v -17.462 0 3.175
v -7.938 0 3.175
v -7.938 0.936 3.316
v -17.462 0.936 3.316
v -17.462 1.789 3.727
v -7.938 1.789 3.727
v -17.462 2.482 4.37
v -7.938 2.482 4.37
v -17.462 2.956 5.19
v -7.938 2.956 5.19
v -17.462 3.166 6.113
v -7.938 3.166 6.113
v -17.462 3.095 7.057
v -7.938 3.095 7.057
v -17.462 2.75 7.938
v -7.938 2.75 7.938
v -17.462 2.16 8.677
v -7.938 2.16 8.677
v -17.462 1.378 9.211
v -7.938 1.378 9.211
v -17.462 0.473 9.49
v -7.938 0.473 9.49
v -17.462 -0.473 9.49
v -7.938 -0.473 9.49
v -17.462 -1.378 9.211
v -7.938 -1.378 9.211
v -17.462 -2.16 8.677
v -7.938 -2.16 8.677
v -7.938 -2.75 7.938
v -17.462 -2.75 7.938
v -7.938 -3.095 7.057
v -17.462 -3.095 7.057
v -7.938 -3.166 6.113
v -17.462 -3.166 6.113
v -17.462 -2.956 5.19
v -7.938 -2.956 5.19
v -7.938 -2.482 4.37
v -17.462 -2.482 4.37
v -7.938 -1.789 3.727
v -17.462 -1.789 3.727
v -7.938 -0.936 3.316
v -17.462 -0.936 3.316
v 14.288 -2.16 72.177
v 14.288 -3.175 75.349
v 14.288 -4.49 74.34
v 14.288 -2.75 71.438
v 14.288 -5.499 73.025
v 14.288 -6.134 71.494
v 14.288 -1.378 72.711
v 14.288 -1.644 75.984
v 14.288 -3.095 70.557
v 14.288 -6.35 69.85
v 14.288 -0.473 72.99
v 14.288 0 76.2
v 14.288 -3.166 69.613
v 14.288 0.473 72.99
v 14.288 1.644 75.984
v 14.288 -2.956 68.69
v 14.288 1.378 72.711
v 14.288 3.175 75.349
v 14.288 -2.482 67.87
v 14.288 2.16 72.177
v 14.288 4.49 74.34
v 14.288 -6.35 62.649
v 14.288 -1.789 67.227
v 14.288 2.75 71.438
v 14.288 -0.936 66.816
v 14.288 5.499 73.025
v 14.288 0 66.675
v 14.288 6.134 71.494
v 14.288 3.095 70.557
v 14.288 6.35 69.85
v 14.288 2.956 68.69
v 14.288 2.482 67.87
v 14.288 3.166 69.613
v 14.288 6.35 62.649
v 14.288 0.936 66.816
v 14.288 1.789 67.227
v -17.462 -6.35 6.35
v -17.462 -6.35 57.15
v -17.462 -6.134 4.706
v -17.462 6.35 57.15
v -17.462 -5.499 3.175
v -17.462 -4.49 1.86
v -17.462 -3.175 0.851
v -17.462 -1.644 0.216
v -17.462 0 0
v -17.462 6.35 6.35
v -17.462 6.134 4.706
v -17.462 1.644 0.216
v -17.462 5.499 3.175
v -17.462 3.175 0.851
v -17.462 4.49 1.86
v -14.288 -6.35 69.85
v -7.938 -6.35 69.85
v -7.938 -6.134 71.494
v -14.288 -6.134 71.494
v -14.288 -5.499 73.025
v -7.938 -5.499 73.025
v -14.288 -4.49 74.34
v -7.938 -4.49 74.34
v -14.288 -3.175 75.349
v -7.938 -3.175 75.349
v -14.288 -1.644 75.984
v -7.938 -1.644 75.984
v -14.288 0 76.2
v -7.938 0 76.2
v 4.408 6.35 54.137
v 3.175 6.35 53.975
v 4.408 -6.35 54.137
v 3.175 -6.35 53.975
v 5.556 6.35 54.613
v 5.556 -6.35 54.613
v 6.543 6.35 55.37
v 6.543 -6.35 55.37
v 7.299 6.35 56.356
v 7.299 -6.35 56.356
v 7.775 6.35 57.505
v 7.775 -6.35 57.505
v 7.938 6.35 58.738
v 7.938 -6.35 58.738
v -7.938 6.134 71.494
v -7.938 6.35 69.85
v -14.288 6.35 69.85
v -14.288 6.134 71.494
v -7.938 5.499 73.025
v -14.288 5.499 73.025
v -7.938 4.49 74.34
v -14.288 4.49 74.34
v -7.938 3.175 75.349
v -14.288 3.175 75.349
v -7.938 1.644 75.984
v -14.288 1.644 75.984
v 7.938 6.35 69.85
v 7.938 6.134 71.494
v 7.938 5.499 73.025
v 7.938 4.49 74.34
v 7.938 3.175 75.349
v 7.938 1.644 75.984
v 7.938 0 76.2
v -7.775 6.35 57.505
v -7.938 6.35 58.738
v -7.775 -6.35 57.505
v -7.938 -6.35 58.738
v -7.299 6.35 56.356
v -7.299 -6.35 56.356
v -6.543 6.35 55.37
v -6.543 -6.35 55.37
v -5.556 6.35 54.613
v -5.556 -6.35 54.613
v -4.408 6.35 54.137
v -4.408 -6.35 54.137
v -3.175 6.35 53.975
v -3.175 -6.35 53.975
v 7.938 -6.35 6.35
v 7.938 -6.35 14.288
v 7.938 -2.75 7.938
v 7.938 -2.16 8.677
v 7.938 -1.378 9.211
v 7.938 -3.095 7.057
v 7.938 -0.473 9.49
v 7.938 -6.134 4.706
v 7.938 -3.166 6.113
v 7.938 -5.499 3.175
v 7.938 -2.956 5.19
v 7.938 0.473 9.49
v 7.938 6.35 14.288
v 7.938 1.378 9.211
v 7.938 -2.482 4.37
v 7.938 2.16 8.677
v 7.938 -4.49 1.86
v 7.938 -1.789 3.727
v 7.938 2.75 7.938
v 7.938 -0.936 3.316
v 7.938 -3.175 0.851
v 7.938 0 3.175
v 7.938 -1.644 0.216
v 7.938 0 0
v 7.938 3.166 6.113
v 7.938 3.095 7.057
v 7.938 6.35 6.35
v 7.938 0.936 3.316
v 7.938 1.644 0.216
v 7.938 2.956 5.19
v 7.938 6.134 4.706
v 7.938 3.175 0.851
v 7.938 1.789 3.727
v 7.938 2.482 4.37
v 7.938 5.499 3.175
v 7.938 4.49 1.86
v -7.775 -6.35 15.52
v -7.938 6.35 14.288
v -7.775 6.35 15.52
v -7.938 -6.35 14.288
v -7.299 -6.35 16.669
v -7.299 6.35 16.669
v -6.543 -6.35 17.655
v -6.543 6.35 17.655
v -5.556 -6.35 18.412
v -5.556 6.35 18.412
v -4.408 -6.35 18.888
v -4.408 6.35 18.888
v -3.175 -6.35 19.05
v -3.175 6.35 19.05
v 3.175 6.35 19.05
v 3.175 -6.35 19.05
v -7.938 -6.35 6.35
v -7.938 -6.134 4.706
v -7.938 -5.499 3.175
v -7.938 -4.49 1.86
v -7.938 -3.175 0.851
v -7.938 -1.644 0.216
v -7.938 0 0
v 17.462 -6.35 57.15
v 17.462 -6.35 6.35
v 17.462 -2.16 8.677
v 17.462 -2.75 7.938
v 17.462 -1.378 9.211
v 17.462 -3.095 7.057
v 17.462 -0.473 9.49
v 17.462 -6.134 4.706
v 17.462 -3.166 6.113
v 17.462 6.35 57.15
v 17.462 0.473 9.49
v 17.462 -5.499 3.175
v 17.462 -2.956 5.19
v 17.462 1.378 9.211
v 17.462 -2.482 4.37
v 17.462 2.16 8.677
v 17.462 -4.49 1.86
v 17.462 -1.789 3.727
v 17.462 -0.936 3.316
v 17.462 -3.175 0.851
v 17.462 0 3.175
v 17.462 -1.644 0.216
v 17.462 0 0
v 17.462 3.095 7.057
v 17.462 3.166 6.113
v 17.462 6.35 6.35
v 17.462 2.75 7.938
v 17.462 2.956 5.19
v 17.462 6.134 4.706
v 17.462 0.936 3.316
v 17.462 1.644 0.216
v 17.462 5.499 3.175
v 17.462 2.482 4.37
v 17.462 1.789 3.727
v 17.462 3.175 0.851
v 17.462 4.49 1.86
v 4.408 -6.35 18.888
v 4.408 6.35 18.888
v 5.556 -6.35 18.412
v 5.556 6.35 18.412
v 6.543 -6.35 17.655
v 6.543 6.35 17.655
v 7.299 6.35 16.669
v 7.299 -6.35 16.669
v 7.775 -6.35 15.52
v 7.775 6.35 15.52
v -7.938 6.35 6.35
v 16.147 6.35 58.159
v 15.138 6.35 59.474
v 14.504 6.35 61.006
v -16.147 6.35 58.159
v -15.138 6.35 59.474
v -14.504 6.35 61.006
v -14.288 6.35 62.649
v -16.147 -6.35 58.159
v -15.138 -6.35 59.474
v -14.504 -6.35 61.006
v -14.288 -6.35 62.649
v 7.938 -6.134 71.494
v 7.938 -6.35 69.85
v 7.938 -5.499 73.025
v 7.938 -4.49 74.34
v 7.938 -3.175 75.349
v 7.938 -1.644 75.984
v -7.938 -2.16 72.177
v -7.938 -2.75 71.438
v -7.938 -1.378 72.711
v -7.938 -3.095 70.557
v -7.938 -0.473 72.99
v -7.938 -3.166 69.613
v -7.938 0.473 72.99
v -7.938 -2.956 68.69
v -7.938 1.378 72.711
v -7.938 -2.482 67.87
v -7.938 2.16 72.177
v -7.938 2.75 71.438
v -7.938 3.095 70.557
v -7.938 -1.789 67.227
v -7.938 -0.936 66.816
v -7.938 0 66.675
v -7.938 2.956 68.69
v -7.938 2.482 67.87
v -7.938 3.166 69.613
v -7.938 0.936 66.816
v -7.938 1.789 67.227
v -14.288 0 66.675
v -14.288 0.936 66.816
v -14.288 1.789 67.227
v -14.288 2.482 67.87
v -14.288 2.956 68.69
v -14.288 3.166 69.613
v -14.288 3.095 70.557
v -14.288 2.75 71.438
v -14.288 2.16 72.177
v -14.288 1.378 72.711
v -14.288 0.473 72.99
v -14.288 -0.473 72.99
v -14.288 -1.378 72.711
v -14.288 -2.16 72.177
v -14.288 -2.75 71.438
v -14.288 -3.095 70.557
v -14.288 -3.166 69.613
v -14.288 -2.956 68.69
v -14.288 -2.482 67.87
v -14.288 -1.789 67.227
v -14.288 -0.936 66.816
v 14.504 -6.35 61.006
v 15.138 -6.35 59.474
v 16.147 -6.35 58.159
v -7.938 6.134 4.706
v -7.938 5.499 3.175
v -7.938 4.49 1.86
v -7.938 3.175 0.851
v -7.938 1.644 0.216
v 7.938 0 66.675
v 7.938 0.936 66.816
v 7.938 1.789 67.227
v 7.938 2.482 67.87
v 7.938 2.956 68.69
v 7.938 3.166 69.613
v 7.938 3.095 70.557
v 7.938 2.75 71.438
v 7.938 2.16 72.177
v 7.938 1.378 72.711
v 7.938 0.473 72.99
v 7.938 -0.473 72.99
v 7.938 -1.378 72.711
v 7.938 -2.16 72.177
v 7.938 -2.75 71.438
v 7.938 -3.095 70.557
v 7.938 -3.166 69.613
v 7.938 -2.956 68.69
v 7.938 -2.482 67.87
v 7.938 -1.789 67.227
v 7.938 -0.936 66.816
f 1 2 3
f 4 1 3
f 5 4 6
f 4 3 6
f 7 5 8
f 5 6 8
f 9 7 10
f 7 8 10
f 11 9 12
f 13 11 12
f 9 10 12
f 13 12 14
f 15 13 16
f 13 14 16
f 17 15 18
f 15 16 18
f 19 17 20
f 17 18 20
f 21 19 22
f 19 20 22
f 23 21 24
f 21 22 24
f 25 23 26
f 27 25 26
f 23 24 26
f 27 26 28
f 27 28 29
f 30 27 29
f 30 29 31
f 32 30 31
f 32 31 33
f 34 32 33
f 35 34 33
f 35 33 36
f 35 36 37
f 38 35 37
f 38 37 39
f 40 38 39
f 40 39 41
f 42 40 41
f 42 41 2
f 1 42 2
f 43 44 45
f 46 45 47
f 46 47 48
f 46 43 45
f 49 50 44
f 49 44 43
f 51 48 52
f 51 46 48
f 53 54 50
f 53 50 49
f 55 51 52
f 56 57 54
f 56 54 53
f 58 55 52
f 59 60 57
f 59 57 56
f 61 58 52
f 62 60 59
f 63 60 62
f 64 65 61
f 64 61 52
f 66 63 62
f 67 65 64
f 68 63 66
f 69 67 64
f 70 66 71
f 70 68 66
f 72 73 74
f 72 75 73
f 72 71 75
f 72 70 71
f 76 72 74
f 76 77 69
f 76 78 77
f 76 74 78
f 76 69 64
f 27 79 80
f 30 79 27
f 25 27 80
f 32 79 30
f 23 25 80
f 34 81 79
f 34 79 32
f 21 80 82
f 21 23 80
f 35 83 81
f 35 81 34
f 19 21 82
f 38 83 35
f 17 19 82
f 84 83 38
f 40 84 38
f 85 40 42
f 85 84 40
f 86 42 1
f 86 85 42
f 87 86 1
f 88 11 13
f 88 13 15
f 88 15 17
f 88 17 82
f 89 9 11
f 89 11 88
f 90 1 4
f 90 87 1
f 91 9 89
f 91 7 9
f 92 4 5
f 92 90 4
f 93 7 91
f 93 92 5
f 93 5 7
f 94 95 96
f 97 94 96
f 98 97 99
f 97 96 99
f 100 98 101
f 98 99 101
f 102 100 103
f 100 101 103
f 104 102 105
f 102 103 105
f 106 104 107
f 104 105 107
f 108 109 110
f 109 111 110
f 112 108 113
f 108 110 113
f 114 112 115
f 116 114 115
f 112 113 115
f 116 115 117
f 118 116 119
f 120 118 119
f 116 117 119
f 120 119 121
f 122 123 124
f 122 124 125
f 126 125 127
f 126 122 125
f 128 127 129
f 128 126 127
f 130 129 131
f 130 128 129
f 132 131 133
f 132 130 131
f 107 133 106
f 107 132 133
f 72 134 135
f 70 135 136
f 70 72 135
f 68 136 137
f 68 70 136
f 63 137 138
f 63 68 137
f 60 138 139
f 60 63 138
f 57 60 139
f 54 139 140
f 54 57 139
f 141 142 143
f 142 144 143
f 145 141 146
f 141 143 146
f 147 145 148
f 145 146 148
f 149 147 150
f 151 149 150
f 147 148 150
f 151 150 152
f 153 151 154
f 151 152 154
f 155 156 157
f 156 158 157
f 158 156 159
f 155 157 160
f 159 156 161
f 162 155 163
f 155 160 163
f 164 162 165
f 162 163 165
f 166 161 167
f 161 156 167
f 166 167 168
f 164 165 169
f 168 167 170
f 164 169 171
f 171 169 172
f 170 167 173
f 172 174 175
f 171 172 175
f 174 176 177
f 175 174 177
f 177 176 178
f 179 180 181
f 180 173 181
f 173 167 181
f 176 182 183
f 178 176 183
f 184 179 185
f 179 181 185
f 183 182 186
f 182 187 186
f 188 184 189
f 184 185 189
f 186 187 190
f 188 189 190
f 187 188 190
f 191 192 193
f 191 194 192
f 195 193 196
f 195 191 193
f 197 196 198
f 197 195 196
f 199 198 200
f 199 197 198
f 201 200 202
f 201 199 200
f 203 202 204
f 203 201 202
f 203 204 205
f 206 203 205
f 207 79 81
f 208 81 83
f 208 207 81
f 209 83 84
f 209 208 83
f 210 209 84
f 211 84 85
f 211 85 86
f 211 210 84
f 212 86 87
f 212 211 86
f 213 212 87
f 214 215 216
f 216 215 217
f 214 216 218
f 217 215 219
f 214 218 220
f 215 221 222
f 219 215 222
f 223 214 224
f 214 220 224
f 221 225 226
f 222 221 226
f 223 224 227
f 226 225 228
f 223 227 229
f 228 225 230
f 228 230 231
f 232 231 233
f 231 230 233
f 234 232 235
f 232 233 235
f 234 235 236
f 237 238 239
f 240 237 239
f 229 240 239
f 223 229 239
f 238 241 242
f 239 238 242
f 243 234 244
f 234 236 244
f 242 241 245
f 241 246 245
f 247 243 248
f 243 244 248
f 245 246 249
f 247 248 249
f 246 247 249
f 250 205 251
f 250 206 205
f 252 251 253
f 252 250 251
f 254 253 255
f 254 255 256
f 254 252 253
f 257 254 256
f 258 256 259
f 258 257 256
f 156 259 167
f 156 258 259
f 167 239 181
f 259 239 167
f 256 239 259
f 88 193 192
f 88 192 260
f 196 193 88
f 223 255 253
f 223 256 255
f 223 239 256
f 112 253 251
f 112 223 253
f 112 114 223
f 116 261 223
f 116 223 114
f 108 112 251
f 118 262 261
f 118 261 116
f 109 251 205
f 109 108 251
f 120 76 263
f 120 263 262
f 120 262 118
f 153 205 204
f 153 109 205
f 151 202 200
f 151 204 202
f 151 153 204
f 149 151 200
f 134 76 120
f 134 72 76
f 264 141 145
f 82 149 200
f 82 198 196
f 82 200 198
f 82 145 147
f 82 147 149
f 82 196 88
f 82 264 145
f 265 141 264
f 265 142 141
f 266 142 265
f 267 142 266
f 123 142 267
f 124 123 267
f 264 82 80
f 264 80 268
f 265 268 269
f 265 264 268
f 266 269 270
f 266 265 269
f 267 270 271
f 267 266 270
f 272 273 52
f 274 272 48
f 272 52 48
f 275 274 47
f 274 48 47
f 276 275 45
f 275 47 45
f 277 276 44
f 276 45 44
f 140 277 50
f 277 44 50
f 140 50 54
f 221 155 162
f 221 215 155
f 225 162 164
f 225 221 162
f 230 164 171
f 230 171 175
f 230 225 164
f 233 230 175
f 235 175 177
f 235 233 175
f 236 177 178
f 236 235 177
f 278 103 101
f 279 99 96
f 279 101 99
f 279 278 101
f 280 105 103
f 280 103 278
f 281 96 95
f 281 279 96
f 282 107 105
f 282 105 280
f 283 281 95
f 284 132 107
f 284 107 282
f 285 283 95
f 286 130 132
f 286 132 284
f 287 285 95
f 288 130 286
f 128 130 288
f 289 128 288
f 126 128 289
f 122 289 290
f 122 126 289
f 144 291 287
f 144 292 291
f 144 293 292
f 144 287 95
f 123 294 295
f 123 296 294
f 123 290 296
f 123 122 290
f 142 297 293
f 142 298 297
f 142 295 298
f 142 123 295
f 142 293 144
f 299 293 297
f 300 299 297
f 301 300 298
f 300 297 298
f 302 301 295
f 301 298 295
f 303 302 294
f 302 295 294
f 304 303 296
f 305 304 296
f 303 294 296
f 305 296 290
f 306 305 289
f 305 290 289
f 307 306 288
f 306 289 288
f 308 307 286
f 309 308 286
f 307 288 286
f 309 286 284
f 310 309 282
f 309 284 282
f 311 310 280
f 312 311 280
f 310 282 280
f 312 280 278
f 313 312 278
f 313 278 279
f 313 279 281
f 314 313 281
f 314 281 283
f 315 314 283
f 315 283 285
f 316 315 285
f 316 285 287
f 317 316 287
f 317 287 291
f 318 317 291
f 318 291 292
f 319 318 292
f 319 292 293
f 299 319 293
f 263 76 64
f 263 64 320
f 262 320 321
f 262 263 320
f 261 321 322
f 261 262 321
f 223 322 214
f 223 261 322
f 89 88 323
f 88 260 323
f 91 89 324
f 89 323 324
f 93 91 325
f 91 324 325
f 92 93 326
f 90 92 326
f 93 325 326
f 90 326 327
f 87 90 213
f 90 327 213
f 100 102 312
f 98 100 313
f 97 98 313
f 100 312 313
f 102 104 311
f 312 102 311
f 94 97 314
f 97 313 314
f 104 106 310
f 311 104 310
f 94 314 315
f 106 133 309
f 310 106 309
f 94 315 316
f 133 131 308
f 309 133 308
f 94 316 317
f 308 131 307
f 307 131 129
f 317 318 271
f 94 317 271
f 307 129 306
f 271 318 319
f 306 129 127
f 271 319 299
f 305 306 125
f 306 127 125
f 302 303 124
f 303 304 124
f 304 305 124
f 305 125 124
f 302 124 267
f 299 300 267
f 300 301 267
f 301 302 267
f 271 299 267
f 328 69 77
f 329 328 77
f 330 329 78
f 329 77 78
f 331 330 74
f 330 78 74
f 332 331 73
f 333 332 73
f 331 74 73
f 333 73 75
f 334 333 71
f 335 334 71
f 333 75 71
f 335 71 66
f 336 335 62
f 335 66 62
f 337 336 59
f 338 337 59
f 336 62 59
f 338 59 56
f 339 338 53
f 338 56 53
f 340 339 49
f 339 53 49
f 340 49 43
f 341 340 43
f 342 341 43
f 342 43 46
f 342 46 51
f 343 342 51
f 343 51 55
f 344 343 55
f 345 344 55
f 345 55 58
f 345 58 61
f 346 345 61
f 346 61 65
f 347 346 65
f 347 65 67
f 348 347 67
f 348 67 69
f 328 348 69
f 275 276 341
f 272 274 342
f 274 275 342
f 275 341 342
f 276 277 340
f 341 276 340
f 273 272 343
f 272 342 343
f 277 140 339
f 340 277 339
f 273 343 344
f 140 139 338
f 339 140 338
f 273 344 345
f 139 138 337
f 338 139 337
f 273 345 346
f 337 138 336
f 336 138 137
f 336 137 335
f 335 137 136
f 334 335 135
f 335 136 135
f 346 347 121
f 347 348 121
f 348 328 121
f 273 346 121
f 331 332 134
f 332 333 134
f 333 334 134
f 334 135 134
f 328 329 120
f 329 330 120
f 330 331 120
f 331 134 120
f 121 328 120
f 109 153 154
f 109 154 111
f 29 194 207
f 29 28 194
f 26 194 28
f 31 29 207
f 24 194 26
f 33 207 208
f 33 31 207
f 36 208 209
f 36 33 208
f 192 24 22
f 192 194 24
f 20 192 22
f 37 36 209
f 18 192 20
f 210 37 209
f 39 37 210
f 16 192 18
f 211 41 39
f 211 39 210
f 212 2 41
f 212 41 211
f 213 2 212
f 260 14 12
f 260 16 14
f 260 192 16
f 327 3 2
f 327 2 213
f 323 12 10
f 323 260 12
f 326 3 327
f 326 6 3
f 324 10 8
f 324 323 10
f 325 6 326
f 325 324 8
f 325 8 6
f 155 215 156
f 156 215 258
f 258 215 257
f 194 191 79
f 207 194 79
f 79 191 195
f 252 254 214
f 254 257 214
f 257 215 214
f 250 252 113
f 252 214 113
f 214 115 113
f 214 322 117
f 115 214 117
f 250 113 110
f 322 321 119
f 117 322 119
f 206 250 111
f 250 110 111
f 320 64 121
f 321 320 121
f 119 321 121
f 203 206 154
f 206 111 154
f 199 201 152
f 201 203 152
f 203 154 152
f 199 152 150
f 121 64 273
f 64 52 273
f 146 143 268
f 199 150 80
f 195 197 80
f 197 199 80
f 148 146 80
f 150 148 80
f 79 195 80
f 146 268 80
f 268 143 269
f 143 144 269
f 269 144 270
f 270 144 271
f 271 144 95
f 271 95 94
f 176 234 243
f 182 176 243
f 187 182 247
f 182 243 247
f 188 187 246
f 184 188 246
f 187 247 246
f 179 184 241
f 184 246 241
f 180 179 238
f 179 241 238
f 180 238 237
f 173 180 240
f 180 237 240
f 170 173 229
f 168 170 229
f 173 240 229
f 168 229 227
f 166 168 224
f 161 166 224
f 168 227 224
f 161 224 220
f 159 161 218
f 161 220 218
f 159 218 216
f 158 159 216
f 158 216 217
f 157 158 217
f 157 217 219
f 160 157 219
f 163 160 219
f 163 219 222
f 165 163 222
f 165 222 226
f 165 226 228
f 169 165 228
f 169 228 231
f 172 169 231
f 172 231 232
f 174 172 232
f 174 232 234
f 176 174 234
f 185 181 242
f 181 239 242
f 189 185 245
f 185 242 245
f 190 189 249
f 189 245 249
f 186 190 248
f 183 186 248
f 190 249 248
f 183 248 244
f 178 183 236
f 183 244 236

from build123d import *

# Parameters (mm, degrees)
SKETCH4_W           = 34.925
SKETCH4_H           = 12.7
BOSS_EXTRUDE2_DEPTH = 76.2
SKETCH6_W           = 15.875
SKETCH6_H           = 22.225
SKETCH6_H_2         = 19.05
CUT_EXTRUDE4_DEPTH  = 80.200182489
FILLET3_R           = 6.35
SKETCH7_R           = 3.175
CUT_EXTRUDE5_DEPTH  = 85.062584572
FILLET4_R           = 4.7625
FILLET5_R           = 4.7625
SKETCH8_W           = 3.175
SKETCH8_H           = 19.05
CUT_EXTRUDE6_DEPTH  = 80.200182489
FILLET6_R           = 6.35


# Some blends are built 0.0001 mm under size
with BuildPart() as part:
    # Sketch4 → Boss-Extrude2 (new body)
    with BuildSketch(Plane.XY):
        Rectangle(SKETCH4_W, SKETCH4_H)
    extrude(amount=BOSS_EXTRUDE2_DEPTH)

    # Sketch6 → Cut-Extrude4 (cut, through all)
    with BuildSketch(Plane(origin=(0, 6.35, 0), x_dir=(1, 0, 0), z_dir=(0, 1, 0))):
        with Locations((0, -65.0875)):
            Rectangle(SKETCH6_W, SKETCH6_H)
        with Locations((0, -9.525)):
            Rectangle(SKETCH6_W, SKETCH6_H_2)
    extrude(amount=-CUT_EXTRUDE4_DEPTH, mode=Mode.SUBTRACT)

    # Fillet3
    fillet3_edges = [part.edges().sort_by_distance(p)[0] for p in [
        (-12.7, -6.35, 0),
        (12.7, -6.35, 0),
        (-12.7, 6.35, 0),
        (12.7, 6.35, 0),
        (12.7, -6.35, 76.2),
        (12.7, 6.35, 76.2),
        (-12.7, -6.35, 76.2),
        (-12.7, 6.35, 76.2),
    ]]
    fillet(fillet3_edges, radius=FILLET3_R - 0.0001)  # a hair under: the kernel refuses the full size

    # Sketch7 → Cut-Extrude5 (cut, through all)
    with BuildSketch(Plane(origin=(17.4625, 0, 0), x_dir=(0, 0, -1), z_dir=(1, 0, 0))):
        with Locations((-6.35, 0)):
            Circle(SKETCH7_R)
        with Locations((-69.85, 0)):
            Circle(SKETCH7_R)
    extrude(amount=-CUT_EXTRUDE5_DEPTH, mode=Mode.SUBTRACT)

    # Fillet4
    fillet4_edges = [part.edges().sort_by_distance(p)[0] for p in [
        (-7.9375, 0, 19.05),
        (7.9375, 0, 19.05),
    ]]
    fillet(fillet4_edges, radius=FILLET4_R)

    # Fillet5
    fillet5_edges = [part.edges().sort_by_distance(p)[0] for p in [
        (-7.9375, 0, 53.975),
        (7.9375, 0, 53.975),
    ]]
    fillet(fillet5_edges, radius=FILLET5_R)

    # Sketch8 → Cut-Extrude6 (cut, through all)
    with BuildSketch(Plane(origin=(0, 6.35, 0), x_dir=(1, 0, 0), z_dir=(0, 1, 0))):
        with Locations((15.875, -66.675)):
            Rectangle(SKETCH8_W, SKETCH8_H)
        with Locations((-15.875, -66.675)):
            Rectangle(SKETCH8_W, SKETCH8_H)
    extrude(amount=-CUT_EXTRUDE6_DEPTH, mode=Mode.SUBTRACT)

    # Fillet6
    # the kernel refuses this fillet: 6.35 mm, written as the material it adds along each edge
    with BuildSketch(Plane(origin=(-14.2875, 6.35, 57.15), x_dir=(0, 0, 1), z_dir=(0, -1, 0))) as fillet6_piece_1:
        with BuildLine():
            CenterArc((5.499261314, 6.35), FILLET6_R, 210, 60)
            Line((0, 3.175), (-0.109985226, 3.1115))
            ThreePointArc((-0.109985226, 3.1115), (-0.127, 1.5875), (-0.127, 0))
            Line((-0.127, 0), (0, -0.127))
            Line((0, -0.127), (5.499261314, -0.127))
            Line((5.499261314, -0.127), (5.499261314, 0))
        make_face()
    extrude(amount=12.7)
    with BuildSketch(Plane(origin=(14.2875, 6.35, 57.15), x_dir=(1, 0, 0), z_dir=(0, -1, 0))) as fillet6_piece_2:
        with BuildLine():
            CenterArc((6.35, 5.499261314), FILLET6_R, 180, 60)
            Line((0, 5.499261314), (-0.127, 5.499261314))
            Line((-0.127, 5.499261314), (-0.127, 0))
            Line((-0.127, 0), (0, -0.127))
            ThreePointArc((0, -0.127), (1.5875, -0.127), (3.1115, -0.109985226))
            Line((3.1115, -0.109985226), (3.175, 0))
        make_face()
    extrude(amount=12.7)


solid = part.part
